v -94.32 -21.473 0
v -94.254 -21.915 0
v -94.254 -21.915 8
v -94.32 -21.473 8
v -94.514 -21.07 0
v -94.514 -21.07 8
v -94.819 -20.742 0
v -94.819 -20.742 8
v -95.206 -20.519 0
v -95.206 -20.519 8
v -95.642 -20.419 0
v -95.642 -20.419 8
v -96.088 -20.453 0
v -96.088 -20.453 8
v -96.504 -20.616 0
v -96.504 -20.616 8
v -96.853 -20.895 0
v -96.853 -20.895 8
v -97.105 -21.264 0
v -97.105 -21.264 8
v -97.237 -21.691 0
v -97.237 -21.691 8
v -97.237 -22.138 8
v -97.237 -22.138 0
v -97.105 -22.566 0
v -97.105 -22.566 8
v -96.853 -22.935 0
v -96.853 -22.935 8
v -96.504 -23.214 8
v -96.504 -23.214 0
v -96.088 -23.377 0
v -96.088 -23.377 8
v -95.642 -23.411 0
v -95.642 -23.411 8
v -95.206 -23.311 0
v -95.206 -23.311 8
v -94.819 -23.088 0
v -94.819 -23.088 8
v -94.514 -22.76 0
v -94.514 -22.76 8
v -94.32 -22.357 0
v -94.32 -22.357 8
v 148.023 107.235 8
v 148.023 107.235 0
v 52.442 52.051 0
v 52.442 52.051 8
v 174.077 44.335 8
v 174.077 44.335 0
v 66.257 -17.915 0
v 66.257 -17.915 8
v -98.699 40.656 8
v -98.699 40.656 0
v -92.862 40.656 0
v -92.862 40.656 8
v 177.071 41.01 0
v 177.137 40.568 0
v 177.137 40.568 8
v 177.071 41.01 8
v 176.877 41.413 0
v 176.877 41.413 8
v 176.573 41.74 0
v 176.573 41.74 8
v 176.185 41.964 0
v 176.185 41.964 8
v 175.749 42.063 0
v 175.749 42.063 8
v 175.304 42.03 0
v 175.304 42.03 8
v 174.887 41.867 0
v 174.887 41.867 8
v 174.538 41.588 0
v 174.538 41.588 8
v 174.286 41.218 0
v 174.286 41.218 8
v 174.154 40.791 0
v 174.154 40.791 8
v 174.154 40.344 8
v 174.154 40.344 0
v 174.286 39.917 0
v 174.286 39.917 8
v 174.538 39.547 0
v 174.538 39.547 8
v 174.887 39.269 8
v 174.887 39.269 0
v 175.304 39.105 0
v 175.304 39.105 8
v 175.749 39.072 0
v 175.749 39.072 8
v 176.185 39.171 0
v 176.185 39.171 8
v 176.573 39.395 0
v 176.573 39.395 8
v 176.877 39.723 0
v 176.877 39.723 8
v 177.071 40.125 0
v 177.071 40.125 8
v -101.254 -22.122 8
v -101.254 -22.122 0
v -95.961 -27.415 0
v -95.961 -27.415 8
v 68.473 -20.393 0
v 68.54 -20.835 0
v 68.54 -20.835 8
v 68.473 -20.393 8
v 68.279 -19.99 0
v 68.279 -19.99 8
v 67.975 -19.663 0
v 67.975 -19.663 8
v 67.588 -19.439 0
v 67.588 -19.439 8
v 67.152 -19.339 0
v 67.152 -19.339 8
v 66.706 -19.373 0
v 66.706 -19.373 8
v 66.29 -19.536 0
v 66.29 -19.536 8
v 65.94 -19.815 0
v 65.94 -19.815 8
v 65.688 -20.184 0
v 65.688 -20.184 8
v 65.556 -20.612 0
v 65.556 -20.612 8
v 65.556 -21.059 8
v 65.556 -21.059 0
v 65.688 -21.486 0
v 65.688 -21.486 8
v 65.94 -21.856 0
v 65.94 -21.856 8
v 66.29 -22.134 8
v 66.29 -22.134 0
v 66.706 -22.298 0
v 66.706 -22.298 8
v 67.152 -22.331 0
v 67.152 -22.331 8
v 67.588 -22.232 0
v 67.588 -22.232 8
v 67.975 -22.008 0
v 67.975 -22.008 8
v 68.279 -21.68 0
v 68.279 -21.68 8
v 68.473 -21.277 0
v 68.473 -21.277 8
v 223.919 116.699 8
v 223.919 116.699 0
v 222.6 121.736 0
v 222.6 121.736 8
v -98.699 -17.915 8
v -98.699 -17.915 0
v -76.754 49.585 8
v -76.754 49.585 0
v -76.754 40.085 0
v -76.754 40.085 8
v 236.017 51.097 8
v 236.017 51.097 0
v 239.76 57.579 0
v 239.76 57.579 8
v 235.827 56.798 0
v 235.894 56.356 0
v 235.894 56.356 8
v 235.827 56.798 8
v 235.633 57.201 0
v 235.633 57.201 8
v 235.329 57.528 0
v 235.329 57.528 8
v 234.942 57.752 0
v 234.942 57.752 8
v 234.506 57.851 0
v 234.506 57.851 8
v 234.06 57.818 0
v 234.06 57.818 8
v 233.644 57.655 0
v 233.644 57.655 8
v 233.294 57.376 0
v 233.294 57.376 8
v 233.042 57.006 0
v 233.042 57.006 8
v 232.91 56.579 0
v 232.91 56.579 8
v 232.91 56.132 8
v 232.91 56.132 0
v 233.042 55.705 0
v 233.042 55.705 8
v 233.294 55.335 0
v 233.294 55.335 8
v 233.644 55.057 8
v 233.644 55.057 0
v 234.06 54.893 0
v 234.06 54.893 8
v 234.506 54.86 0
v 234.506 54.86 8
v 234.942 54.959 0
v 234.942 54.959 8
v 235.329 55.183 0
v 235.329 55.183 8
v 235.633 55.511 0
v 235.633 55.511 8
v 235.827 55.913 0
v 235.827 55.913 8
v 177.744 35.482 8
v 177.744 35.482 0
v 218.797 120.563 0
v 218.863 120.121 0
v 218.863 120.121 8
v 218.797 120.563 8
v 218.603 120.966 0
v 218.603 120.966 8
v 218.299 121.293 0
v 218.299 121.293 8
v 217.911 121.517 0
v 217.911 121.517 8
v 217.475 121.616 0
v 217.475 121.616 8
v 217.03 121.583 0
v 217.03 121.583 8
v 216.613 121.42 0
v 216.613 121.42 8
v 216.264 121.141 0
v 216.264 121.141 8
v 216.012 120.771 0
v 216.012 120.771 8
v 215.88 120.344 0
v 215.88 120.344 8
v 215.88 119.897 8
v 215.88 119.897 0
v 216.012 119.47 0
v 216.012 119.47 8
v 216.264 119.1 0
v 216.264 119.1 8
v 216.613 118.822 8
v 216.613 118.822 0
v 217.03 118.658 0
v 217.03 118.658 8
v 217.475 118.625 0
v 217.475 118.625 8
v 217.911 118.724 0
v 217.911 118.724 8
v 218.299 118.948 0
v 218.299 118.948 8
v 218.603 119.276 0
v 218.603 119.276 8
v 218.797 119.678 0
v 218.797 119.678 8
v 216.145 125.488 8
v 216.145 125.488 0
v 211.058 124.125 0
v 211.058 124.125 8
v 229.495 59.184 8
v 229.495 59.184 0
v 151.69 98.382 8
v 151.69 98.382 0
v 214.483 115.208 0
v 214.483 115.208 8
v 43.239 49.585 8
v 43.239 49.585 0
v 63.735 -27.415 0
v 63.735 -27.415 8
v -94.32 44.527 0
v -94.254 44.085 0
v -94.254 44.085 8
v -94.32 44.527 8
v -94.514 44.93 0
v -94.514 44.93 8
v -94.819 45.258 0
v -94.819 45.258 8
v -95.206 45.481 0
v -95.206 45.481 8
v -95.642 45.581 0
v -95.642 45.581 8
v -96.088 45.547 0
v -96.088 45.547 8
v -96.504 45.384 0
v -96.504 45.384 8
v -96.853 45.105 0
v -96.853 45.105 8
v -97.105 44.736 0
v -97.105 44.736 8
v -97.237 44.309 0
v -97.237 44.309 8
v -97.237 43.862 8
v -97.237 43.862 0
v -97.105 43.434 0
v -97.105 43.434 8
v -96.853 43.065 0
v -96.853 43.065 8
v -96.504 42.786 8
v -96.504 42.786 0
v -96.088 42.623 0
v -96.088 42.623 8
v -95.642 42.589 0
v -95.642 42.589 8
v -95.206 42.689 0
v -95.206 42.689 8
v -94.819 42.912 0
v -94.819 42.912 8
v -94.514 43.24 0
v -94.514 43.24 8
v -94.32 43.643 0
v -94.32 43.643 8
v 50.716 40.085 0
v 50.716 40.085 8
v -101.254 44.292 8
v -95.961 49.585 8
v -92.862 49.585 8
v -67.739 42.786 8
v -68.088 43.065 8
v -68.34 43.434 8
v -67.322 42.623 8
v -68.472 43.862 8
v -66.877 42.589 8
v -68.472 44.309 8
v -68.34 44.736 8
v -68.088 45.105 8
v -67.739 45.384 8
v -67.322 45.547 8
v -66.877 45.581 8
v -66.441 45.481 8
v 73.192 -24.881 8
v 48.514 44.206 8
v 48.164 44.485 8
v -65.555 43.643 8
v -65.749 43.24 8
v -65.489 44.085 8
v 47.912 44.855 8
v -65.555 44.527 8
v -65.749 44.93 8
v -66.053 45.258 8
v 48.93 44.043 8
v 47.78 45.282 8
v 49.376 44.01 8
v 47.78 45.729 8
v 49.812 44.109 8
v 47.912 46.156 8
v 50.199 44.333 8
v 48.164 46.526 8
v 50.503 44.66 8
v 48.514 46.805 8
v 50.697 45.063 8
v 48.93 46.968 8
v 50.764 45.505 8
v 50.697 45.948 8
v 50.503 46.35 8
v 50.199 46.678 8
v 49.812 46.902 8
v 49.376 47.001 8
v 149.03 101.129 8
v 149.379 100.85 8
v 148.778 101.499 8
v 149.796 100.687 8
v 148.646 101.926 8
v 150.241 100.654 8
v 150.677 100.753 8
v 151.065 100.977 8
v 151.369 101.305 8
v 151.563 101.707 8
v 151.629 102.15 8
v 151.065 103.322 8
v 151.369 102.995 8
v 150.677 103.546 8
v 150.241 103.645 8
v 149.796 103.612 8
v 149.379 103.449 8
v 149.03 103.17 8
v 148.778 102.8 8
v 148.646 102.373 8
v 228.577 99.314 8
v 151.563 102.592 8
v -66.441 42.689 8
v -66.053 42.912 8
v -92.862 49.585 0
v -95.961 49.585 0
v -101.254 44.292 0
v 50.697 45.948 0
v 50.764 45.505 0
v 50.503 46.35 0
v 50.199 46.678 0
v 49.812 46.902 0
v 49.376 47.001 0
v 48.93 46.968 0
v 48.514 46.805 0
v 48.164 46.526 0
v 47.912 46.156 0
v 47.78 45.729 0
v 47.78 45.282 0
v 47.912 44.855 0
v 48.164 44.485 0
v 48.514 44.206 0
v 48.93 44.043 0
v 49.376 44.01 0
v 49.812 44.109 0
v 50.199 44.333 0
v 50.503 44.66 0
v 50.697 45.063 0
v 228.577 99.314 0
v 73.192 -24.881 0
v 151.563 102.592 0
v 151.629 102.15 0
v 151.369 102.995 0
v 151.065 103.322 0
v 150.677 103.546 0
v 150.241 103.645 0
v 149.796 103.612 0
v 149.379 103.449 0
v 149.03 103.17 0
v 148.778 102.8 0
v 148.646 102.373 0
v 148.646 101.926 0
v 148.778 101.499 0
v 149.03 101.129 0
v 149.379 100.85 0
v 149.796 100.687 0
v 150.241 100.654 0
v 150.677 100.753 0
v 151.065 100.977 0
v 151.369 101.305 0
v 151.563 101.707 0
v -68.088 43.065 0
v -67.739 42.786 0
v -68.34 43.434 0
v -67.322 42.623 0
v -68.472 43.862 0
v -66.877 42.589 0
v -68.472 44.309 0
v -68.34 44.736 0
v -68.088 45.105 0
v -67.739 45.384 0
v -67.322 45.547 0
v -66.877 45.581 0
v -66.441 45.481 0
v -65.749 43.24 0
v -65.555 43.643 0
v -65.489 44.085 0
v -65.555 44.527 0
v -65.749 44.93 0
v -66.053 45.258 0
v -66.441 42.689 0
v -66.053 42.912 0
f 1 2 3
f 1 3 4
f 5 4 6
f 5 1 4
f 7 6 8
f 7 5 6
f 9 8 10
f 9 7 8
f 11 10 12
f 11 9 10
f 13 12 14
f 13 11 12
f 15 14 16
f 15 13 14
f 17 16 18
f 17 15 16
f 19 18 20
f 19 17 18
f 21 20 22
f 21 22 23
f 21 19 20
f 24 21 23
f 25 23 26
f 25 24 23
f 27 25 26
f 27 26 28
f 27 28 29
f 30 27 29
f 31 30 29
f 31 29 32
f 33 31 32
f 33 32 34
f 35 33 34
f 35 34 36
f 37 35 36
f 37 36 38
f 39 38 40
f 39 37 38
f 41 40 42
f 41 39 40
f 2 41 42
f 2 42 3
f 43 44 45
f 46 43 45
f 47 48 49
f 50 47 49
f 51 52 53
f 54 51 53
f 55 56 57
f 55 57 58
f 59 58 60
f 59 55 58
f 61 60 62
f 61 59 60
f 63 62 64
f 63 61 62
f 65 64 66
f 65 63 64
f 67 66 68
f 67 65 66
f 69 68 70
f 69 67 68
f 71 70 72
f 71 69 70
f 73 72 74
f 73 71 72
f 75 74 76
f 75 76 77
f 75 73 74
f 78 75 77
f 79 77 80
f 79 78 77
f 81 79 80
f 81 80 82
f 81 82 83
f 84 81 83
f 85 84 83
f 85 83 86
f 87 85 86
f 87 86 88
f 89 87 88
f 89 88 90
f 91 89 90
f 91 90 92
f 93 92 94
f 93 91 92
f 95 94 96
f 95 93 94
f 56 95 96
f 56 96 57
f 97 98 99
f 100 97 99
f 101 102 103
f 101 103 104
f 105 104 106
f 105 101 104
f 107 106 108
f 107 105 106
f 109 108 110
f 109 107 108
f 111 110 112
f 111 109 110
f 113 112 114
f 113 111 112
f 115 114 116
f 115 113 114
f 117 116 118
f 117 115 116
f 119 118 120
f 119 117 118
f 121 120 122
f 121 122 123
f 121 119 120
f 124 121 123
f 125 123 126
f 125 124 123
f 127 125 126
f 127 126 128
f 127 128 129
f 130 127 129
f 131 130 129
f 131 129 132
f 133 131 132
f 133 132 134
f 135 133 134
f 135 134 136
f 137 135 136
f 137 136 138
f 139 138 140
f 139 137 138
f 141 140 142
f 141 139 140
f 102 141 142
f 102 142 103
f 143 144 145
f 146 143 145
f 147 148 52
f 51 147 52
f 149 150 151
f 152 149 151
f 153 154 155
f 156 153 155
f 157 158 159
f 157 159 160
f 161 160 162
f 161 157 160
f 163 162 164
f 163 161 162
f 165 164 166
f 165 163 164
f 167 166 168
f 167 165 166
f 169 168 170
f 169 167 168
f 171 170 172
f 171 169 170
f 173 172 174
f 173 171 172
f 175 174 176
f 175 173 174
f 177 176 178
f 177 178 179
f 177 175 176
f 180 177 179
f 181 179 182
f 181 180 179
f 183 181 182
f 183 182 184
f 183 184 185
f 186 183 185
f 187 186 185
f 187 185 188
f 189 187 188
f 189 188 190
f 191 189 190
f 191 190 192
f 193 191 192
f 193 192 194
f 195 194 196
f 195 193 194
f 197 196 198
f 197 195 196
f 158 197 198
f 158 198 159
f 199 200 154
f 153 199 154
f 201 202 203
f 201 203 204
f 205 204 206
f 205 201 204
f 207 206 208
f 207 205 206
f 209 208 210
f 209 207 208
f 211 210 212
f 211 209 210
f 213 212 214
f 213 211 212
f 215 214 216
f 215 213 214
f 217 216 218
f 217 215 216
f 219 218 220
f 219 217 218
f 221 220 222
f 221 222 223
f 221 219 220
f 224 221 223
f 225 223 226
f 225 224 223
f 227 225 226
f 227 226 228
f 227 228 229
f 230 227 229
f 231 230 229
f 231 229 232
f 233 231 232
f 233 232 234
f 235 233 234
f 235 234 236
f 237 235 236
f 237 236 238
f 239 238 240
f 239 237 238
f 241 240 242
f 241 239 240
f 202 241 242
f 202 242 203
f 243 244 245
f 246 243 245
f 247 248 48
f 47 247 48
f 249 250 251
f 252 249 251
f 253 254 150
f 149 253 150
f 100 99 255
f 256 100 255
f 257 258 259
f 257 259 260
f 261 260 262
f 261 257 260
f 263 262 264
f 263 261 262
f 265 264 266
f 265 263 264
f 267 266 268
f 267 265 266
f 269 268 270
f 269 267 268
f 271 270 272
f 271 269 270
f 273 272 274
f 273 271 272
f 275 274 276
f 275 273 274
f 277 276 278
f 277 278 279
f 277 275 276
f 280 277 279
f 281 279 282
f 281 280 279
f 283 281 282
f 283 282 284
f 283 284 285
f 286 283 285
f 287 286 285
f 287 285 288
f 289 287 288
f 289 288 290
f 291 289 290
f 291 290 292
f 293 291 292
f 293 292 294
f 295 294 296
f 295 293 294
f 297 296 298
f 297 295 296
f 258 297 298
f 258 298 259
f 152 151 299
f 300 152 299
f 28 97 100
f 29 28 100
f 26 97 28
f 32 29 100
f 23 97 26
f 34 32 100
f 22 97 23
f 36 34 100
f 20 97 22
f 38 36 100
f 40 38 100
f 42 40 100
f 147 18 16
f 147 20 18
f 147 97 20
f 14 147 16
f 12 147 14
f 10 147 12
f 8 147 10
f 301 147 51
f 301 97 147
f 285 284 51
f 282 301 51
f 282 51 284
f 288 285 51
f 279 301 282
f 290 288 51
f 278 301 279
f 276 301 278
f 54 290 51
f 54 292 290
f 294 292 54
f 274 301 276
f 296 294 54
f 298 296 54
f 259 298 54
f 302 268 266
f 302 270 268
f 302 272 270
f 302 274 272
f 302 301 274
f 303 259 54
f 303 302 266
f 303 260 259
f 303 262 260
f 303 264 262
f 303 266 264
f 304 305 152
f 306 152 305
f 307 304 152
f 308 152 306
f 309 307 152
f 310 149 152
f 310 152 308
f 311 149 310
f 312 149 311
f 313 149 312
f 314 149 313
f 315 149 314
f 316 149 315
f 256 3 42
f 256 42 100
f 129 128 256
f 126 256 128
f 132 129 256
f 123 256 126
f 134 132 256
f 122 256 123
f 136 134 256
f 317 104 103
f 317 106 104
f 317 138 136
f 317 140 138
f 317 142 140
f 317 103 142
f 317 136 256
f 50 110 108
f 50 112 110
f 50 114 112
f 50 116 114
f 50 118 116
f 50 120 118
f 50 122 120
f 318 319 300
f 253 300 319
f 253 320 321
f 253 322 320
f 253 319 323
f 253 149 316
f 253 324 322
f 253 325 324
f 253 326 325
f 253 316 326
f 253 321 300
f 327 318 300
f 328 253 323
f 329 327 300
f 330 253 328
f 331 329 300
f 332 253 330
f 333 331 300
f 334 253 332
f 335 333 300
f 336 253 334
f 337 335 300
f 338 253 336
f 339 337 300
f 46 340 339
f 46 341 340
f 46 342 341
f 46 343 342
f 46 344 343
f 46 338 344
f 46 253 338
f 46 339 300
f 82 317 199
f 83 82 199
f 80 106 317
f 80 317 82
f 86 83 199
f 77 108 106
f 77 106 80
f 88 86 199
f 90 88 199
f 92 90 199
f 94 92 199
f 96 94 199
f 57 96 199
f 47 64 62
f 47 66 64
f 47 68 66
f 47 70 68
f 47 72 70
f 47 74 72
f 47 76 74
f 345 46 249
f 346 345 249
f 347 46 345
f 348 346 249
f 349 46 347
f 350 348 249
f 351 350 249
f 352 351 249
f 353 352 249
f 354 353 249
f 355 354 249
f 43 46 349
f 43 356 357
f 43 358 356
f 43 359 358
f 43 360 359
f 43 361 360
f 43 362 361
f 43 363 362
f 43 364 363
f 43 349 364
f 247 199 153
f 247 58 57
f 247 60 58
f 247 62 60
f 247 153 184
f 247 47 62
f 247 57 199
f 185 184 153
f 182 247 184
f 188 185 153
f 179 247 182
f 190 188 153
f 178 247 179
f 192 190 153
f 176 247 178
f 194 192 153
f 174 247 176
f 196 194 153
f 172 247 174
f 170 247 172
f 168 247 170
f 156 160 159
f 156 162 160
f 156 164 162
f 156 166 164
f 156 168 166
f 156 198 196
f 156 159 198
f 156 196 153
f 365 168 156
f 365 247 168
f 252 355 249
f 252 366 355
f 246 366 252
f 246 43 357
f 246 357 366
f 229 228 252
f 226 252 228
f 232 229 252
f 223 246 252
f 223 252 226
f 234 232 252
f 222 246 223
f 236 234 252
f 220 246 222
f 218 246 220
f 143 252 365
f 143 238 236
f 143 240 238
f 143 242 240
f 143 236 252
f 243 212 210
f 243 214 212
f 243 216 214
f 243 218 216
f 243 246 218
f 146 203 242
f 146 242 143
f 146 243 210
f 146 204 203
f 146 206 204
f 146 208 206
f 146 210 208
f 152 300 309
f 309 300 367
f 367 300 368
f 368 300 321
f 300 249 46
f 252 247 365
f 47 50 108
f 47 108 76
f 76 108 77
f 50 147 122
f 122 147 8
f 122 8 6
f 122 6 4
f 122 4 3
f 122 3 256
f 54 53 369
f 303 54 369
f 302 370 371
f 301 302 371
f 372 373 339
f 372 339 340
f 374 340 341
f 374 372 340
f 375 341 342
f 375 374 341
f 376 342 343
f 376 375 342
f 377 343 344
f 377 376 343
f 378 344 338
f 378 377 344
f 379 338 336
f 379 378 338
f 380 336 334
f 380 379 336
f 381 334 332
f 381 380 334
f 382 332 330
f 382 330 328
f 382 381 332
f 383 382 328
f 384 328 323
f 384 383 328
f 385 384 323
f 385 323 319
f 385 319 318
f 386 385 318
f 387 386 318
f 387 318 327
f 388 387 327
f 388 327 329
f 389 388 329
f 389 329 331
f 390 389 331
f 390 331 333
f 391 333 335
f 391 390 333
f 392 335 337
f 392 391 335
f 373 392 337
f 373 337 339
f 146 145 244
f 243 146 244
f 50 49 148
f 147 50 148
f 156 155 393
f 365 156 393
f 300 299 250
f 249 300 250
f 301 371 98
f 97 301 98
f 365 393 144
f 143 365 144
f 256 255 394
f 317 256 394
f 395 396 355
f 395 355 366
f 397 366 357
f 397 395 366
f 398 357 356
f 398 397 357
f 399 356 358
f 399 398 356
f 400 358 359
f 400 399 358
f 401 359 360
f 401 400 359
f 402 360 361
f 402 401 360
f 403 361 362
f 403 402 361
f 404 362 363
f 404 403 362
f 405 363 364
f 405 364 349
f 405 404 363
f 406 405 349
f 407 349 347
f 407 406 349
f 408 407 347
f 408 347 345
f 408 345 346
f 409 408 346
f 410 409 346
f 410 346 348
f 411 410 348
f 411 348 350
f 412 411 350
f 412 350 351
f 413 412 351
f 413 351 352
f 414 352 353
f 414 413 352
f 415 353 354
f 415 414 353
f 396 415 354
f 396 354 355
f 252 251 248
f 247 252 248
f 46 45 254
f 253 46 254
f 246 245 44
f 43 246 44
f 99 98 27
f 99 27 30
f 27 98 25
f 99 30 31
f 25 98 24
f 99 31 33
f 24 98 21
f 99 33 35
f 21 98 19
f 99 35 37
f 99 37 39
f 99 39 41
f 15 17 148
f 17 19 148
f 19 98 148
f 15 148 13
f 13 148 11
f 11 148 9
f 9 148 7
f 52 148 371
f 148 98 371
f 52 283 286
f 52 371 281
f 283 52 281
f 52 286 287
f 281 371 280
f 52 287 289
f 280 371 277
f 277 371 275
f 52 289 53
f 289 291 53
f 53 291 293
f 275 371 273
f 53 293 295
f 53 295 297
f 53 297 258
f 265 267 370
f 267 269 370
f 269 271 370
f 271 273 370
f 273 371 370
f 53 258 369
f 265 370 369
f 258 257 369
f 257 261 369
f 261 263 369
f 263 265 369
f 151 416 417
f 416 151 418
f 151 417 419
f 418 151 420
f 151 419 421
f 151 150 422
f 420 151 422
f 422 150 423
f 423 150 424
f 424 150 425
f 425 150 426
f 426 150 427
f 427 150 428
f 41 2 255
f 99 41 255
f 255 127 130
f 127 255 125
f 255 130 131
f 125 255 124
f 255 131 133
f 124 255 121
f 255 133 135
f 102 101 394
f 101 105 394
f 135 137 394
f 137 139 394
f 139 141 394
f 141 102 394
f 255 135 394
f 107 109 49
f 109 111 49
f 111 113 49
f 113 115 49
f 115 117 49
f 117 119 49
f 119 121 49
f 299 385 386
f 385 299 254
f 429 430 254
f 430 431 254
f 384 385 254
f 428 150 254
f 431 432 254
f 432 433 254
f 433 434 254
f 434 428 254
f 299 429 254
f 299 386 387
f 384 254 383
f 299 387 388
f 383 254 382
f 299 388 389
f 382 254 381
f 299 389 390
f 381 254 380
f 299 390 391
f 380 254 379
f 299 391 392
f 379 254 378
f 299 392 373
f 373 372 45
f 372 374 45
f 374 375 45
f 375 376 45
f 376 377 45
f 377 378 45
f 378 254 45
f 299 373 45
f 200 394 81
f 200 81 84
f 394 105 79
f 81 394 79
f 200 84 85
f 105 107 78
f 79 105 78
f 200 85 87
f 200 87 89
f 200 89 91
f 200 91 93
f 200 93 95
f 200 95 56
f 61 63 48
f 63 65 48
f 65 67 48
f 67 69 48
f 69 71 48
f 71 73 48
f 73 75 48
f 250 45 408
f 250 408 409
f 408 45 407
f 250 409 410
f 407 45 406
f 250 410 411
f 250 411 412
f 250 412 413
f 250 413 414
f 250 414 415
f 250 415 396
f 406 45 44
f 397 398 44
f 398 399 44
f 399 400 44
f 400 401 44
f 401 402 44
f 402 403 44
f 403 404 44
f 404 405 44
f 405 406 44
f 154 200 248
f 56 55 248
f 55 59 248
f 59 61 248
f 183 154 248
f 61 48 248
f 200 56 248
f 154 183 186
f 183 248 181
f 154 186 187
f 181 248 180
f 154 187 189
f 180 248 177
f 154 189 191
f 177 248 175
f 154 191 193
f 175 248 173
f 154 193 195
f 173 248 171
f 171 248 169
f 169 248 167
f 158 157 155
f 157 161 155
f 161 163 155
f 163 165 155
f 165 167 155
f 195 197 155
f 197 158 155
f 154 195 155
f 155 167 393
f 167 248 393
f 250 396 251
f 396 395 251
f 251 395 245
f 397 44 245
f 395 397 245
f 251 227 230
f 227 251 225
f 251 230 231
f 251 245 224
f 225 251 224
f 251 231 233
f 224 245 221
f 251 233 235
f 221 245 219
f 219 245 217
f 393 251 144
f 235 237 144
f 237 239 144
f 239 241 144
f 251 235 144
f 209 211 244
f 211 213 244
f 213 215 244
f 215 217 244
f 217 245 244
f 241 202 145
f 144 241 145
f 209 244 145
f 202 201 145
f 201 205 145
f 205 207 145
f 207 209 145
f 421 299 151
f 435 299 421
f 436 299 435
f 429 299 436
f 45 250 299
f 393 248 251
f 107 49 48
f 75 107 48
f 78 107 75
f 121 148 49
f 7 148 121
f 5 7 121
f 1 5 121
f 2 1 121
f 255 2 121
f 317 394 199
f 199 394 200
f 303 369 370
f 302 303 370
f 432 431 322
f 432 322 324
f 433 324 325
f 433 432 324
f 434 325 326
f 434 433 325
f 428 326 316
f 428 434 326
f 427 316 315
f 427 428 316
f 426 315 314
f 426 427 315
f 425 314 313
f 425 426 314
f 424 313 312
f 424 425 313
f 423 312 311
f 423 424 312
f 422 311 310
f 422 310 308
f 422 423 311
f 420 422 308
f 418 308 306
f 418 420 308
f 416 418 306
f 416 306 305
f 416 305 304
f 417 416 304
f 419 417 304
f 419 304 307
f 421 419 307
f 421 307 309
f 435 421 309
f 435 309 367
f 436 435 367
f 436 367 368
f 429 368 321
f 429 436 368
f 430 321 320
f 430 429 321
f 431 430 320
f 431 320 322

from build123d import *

# Parameters (mm, degrees)
ESQUISSE1_R        = 1.5
BOSS_EXTRU_1_DEPTH = 8


with BuildPart() as part:
    # Esquisse1 → Boss.-Extru.1 (new body)
    with BuildSketch(Plane.XY):
        Polygon((43.238760989, 49.585106383), (-75.988646329, 49.585106383), (-76.753762562, 49.585106383), (-76.753762562, 40.085106383), (2.011353671, 40.085106383), (50.71612997, 40.085106383), (151.689760112, 98.382258927), (214.4831558, 115.207698591), (229.494660416, 59.184000666), (174.076924484, 44.334863077), (66.257183131, -17.914893617), (-98.698564415, -17.914893617), (-98.698564415, 40.655573641), (-94.860830925, 40.655573641), (-92.861789188, 40.655573641), (-92.861789188, 49.585106383), (-94.860830925, 49.585106383), (-95.960869343, 49.585106383), (-101.253762562, 44.292213164), (-101.253762562, 35.79522772), (-101.253762562, -22.122000398), (-95.960869343, -27.414893617), (63.734552111, -27.414893617), (73.191845678, -24.880819443), (177.743787613, 35.482272378), (236.017194438, 51.096584676), (239.759835125, 57.579028501), (228.577013006, 99.31388882), (223.918643626, 116.699160027), (222.600104344, 121.736116557), (216.144691957, 125.488029577), (211.058449045, 124.125174896), (148.022896982, 107.234849626), (52.44172146, 52.051032209), align=None)
        with Locations((-95.753762562, -21.914893617)):
            Circle(ESQUISSE1_R, mode=Mode.SUBTRACT)
        with Locations((67.039694146, -20.835264486)):
            Circle(ESQUISSE1_R, mode=Mode.SUBTRACT)
        with Locations((-95.753762562, 44.085106383)):
            Circle(ESQUISSE1_R, mode=Mode.SUBTRACT)
        with Locations((-66.988646329, 44.085106383)):
            Circle(ESQUISSE1_R, mode=Mode.SUBTRACT)
        with Locations((49.263745973, 45.505477252)):
            Circle(ESQUISSE1_R, mode=Mode.SUBTRACT)
        with Locations((175.637377655, 40.567595866)):
            Circle(ESQUISSE1_R, mode=Mode.SUBTRACT)
        with Locations((234.393639901, 56.355573542)):
            Circle(ESQUISSE1_R, mode=Mode.SUBTRACT)
        with Locations((150.12930694, 102.149526137)):
            Circle(ESQUISSE1_R, mode=Mode.SUBTRACT)
        with Locations((217.363403759, 120.120565138)):
            Circle(ESQUISSE1_R, mode=Mode.SUBTRACT)
    extrude(amount=BOSS_EXTRU_1_DEPTH)


solid = part.part
